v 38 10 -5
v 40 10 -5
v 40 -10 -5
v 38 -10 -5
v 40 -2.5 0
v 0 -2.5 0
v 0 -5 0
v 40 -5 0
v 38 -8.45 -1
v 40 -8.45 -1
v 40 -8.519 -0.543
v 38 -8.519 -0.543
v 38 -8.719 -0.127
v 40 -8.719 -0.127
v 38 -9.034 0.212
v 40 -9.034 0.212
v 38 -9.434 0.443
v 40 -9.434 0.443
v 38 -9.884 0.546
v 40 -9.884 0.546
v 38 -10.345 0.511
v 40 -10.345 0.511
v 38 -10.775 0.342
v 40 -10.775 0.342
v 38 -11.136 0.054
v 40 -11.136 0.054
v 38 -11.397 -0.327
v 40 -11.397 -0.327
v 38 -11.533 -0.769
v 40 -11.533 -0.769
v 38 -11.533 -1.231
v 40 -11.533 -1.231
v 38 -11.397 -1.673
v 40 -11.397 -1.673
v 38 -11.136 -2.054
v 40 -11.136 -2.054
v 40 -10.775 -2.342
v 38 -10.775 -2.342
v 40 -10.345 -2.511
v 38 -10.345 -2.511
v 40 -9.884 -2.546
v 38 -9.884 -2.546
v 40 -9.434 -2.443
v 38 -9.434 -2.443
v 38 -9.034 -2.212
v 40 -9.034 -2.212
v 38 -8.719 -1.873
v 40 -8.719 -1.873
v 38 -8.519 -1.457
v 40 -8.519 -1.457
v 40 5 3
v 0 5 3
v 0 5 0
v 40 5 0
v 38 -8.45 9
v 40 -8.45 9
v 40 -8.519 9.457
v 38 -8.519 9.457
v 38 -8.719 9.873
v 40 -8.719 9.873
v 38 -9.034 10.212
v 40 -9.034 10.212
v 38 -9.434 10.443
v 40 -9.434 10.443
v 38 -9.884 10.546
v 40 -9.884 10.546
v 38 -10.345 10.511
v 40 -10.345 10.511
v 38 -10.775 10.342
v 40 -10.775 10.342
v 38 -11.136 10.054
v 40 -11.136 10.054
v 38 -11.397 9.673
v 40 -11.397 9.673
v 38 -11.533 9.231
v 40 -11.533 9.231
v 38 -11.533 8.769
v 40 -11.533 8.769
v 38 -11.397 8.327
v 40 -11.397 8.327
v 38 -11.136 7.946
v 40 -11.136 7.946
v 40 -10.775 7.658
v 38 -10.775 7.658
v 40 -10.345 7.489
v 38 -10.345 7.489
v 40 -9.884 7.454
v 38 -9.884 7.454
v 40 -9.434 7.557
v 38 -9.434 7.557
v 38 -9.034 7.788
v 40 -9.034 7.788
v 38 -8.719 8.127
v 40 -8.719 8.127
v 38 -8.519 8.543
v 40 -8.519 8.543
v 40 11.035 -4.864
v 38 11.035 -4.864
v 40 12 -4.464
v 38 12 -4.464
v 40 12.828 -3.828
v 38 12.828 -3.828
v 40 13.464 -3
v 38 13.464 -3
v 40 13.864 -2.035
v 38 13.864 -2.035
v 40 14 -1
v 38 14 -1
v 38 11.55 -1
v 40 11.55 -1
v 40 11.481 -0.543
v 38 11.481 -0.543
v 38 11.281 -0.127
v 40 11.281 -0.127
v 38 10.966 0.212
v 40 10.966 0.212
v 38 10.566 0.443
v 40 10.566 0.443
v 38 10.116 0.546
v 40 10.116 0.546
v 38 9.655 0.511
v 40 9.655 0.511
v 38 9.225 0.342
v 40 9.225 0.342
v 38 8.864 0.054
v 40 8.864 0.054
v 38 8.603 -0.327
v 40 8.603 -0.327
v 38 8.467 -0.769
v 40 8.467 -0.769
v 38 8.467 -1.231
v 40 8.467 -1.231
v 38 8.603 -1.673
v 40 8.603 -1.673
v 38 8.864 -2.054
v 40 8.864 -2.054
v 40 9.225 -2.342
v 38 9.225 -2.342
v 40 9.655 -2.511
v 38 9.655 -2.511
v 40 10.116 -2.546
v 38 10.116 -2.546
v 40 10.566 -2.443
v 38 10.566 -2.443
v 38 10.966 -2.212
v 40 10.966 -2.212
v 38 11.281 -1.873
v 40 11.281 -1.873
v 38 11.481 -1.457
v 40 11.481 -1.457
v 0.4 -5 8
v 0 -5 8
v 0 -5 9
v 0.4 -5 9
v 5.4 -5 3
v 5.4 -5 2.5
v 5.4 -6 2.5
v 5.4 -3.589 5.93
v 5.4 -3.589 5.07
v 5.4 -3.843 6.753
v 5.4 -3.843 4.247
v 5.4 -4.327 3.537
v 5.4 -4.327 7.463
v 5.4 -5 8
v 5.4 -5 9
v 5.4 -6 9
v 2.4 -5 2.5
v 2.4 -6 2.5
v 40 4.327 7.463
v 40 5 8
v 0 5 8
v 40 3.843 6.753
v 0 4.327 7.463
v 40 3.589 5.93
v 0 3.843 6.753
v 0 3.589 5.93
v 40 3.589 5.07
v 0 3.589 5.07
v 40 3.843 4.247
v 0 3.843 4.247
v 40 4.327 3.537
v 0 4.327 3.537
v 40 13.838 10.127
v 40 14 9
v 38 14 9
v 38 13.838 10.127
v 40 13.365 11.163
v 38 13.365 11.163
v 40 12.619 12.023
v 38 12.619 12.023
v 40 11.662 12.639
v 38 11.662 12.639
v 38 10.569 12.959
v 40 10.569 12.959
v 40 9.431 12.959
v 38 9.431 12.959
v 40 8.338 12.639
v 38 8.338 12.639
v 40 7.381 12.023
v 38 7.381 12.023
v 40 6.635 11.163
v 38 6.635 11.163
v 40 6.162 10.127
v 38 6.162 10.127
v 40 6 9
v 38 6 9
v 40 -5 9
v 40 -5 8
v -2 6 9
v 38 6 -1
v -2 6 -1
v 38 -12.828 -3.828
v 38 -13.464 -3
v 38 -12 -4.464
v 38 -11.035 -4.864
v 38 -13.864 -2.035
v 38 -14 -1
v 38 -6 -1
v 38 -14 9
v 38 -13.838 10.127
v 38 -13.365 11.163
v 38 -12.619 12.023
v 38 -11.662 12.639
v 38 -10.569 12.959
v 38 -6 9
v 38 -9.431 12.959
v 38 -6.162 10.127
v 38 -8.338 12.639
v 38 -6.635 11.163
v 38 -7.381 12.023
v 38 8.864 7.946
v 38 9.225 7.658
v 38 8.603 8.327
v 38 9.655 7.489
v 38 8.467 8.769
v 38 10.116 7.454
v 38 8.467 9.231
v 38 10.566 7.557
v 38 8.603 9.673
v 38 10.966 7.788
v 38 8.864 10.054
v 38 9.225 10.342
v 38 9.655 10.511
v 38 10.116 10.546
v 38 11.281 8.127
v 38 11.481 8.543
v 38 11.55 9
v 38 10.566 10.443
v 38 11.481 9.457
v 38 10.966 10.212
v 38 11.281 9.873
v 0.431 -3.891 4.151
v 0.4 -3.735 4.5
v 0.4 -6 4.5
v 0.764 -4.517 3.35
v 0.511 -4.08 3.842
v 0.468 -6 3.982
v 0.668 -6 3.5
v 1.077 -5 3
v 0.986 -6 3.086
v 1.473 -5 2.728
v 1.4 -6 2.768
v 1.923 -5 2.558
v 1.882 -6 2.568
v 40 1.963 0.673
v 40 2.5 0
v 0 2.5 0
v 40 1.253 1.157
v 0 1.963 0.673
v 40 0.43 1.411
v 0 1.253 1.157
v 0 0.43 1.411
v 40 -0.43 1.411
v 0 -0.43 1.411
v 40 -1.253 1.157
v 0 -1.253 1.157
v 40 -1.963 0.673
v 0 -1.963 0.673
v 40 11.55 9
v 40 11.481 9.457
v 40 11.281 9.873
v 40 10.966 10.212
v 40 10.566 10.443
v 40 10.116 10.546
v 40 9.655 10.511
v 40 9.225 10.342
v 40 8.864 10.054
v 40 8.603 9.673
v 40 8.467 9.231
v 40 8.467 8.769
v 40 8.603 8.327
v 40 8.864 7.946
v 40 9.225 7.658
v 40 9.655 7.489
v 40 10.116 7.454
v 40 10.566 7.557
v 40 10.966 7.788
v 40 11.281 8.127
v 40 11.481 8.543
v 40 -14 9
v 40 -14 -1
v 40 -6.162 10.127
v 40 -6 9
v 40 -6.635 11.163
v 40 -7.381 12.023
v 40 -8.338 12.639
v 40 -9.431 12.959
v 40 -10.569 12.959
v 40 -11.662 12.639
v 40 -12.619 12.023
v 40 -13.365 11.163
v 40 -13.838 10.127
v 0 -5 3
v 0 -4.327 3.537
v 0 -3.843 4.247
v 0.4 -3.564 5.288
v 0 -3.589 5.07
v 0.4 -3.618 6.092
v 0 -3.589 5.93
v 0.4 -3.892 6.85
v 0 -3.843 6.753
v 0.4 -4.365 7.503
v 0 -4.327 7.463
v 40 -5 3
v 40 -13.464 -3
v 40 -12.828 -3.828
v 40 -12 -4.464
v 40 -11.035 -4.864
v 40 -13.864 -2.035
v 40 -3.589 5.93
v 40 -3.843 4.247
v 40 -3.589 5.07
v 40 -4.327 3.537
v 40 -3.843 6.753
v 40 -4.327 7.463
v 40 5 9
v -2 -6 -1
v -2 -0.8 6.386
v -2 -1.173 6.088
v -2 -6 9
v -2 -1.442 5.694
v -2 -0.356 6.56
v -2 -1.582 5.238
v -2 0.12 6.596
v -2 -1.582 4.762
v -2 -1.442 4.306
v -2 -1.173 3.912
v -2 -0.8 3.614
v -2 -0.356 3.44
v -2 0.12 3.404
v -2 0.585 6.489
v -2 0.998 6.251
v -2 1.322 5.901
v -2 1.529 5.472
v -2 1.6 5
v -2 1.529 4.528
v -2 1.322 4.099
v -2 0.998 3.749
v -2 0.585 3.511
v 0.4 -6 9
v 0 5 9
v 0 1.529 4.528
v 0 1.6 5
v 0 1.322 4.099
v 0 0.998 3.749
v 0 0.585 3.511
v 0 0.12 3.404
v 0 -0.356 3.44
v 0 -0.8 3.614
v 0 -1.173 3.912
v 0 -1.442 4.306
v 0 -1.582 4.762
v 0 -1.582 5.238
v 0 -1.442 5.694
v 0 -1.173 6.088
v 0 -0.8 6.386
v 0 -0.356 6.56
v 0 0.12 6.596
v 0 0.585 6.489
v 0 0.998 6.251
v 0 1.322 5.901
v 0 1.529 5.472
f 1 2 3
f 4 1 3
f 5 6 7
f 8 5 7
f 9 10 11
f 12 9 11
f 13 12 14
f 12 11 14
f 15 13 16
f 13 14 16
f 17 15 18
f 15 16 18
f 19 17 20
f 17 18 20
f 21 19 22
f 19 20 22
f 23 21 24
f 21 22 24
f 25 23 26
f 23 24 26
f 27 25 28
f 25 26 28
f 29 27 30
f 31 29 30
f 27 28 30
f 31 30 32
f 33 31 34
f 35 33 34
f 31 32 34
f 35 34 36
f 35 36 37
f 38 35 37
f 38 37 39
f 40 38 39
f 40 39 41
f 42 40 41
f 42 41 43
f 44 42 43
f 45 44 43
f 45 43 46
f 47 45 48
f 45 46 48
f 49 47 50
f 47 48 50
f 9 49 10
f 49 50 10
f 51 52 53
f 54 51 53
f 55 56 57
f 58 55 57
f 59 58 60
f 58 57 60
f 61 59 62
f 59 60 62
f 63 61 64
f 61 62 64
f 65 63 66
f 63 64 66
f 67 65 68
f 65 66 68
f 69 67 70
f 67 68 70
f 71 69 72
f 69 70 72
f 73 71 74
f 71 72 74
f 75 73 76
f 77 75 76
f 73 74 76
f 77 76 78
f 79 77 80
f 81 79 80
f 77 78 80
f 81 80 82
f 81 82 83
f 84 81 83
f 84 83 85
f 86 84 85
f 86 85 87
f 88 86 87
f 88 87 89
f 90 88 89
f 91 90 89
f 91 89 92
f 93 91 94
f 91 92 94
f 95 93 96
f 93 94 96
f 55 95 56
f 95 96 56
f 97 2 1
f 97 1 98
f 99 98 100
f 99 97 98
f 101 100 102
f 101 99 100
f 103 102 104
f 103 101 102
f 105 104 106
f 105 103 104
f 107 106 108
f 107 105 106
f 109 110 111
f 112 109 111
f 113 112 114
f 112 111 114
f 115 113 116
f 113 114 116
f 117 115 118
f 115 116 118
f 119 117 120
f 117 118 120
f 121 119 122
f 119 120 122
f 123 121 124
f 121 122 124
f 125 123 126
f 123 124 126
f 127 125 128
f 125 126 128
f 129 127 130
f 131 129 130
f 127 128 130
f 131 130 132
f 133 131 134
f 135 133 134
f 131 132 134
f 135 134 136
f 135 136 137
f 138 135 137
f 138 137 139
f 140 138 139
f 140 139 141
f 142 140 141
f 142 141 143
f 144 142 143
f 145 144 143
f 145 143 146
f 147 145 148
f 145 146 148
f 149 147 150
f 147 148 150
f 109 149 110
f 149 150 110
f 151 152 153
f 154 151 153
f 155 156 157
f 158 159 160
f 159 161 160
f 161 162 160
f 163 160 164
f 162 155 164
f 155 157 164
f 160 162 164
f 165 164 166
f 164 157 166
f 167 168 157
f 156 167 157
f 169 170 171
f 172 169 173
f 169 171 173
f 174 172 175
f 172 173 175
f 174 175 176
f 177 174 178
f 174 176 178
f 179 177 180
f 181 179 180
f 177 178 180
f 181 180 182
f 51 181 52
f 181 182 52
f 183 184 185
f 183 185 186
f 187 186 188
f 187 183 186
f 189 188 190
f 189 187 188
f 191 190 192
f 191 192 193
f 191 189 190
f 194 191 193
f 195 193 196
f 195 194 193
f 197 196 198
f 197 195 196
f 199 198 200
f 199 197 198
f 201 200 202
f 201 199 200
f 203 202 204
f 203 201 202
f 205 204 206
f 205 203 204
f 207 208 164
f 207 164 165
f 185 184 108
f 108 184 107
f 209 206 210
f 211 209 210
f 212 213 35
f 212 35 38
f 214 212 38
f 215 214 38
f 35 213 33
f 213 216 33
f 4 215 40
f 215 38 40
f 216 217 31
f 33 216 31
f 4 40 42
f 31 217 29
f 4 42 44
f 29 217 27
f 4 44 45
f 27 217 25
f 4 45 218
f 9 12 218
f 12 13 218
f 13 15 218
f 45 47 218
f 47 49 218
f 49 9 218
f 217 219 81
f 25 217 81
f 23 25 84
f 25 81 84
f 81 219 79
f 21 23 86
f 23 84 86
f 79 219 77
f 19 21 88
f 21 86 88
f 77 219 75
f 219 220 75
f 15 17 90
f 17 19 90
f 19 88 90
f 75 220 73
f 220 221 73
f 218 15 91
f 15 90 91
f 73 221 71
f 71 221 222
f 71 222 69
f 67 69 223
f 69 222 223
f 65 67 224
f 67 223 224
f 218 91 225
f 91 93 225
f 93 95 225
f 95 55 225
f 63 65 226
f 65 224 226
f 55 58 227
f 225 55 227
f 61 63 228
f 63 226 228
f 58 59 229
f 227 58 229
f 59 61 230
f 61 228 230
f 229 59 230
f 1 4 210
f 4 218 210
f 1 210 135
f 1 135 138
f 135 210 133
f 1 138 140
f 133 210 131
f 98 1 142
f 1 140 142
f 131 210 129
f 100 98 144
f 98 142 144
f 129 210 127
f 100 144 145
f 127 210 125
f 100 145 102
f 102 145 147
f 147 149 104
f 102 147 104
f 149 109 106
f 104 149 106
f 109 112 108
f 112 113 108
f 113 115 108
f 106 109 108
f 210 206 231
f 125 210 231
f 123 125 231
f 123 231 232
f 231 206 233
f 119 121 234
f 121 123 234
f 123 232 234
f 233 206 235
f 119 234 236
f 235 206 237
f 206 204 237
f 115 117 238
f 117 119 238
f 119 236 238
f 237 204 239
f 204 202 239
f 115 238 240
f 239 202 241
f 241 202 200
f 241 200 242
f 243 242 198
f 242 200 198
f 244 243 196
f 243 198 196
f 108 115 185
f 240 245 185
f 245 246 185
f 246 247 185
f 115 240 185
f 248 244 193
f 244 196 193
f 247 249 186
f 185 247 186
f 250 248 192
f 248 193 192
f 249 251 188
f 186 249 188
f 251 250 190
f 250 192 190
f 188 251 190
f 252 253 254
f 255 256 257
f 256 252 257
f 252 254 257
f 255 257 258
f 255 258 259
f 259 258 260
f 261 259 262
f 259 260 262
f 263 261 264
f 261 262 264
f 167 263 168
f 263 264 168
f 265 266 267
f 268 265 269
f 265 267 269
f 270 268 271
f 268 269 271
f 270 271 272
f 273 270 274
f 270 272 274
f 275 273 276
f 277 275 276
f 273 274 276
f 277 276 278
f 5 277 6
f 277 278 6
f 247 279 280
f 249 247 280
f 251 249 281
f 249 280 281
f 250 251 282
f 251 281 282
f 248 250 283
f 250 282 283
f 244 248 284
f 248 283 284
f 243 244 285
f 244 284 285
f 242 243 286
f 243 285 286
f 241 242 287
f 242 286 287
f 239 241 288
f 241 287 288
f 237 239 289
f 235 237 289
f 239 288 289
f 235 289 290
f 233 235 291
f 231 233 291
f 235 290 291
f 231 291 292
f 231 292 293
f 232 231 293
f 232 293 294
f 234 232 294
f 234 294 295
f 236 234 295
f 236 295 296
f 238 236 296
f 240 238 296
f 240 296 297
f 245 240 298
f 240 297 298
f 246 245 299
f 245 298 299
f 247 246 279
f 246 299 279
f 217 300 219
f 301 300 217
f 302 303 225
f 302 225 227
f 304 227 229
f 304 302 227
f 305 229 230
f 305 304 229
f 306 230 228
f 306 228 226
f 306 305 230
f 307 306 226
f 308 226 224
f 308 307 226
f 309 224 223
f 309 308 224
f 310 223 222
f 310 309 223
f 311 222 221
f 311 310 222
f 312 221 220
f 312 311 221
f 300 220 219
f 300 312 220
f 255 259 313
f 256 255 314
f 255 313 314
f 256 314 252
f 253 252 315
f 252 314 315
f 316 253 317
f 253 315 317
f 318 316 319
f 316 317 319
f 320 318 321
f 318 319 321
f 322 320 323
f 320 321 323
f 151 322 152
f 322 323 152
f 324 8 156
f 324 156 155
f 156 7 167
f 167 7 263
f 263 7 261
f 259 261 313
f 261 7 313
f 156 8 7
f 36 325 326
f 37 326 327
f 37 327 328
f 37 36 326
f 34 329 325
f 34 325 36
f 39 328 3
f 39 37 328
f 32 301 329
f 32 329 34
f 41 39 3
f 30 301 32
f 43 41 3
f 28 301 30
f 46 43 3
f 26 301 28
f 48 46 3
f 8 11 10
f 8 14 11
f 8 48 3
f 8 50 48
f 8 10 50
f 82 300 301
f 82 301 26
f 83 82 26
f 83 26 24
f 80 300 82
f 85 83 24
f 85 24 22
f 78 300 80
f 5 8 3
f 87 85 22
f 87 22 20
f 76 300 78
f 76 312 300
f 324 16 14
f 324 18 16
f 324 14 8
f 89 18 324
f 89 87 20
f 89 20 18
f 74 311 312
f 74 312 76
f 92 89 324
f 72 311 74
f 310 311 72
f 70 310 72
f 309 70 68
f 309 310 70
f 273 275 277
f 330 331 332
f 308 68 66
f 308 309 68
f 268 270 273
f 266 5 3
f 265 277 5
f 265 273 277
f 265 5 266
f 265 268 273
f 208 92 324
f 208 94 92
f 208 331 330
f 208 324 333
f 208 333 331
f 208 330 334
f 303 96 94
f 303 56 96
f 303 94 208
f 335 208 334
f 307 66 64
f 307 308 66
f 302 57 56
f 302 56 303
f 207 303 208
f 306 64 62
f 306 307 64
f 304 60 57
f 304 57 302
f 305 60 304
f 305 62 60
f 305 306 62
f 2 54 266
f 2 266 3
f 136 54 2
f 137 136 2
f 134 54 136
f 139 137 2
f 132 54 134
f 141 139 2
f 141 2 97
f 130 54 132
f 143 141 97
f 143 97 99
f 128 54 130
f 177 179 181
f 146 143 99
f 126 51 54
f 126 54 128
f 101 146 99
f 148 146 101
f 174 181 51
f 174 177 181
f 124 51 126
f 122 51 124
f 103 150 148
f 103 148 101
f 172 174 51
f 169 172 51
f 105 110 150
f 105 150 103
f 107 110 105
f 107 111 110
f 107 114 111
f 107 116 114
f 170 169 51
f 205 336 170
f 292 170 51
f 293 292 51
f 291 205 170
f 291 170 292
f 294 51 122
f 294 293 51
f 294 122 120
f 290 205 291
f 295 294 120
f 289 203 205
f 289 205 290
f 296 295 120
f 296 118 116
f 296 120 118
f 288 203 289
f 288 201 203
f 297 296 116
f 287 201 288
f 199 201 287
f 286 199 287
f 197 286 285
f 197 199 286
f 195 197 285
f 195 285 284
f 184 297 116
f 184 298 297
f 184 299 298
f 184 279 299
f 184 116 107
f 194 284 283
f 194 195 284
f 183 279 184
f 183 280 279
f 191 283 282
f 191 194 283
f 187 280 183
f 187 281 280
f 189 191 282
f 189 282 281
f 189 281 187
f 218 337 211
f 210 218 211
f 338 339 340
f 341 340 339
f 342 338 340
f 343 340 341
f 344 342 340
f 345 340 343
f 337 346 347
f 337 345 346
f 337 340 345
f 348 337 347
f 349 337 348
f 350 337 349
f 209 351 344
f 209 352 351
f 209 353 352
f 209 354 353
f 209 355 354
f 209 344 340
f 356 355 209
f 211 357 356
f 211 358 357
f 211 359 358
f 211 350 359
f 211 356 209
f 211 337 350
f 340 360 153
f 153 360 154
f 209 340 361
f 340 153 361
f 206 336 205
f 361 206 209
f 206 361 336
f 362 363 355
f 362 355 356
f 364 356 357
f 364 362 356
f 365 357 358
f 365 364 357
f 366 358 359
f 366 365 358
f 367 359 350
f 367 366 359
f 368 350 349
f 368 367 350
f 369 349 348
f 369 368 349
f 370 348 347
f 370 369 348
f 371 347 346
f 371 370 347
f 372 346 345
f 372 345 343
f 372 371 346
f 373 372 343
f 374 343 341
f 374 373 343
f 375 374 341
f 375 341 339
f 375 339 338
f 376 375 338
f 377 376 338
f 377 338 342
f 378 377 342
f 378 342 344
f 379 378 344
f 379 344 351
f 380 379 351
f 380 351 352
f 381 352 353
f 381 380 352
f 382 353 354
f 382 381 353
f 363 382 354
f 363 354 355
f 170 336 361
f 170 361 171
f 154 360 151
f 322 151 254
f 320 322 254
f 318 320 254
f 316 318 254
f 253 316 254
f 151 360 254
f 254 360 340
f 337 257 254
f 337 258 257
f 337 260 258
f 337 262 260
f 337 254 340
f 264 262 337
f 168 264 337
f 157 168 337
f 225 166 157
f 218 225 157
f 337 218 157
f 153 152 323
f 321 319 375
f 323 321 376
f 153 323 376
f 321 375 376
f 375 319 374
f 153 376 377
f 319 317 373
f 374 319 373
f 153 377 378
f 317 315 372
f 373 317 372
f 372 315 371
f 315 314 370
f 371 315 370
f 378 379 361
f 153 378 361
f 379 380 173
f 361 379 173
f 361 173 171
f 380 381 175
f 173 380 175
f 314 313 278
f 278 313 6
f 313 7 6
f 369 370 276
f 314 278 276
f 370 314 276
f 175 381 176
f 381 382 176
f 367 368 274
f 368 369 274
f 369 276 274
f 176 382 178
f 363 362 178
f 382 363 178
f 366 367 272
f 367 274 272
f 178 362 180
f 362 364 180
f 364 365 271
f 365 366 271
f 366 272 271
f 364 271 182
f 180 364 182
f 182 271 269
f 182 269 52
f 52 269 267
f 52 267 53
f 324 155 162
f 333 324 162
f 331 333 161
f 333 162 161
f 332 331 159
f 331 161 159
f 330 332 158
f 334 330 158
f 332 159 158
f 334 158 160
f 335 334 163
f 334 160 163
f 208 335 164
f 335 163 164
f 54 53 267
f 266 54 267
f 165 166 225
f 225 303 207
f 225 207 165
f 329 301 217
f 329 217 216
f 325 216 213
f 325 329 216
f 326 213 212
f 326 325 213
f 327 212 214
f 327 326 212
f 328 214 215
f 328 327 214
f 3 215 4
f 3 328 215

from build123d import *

# Parameters (mm, degrees)
PAD_DEPTH    = 40
SKETCH001_W  = 12
SKETCH001_H  = 10
SKETCH001_R  = 1.6
PAD001_DEPTH = 2
SKETCH002_R  = 1.55
PAD002_DEPTH = 2
POCKET_DEPTH = 5


with BuildPart() as part:
    # Sketch → Pad (new body)
    with BuildSketch(Plane.YZ):
        with BuildLine():
            Line((-5, 8), (-5, 9))
            Line((-5, 9), (-6, 9))
            Line((-6, 9), (-6, -1))
            Line((-6, -1), (6, -1))
            Line((6, -1), (6, 9))
            Line((6, 9), (5, 9))
            Line((5, 9), (5, 8))
            ThreePointArc((5, 8), (3.556624, 5.5), (5, 3))
            Line((5, 3), (5, 0))
            Line((5, 0), (2.5, 0))
            ThreePointArc((2.5, 0), (0, 1.443376), (-2.5, 0))
            Line((-2.5, 0), (-5, 0))
            Line((-5, 0), (-5, 3))
            ThreePointArc((-5, 3), (-3.556624, 5.5), (-5, 8))
        make_face()
    extrude(amount=PAD_DEPTH)

    # Sketch001 (on Face15 of Pad) → Pad001 (join)
    with BuildSketch(Plane(origin=(0, 0, 0), x_dir=(0, 1, 0), z_dir=(-1, 0, 0))):
        with Locations((0, -4)):
            Rectangle(SKETCH001_W, SKETCH001_H)
        with Locations((0, -5)):
            Circle(SKETCH001_R, mode=Mode.SUBTRACT)
    extrude(amount=PAD001_DEPTH)

    # Sketch002 (on Face5 of Pad001) → Pad002 (join)
    with BuildSketch(Plane.YZ.offset(40)):
        with BuildLine():
            ThreePointArc((-6, 9), (-10, 13), (-14, 9))
            Line((-14, 9), (-14, -1))
            ThreePointArc((-14, -1), (-12.828427, -3.828427), (-10, -5))
            Line((10, -5), (-10, -5))
            ThreePointArc((10, -5), (12.828427, -3.828427), (14, -1))
            Line((14, 9), (14, -1))
            ThreePointArc((14, 9), (10, 13), (6, 9))
            Line((5, 0), (6, 9))
            Line((-5, 0), (5, 0))
            Line((-6, 9), (-5, 0))
        make_face()
        with Locations((-10, 9)):
            Circle(SKETCH002_R, mode=Mode.SUBTRACT)
        with Locations((10, 9)):
            Circle(SKETCH002_R, mode=Mode.SUBTRACT)
        with Locations((10, -1)):
            Circle(SKETCH002_R, mode=Mode.SUBTRACT)
        with Locations((-10, -1)):
            Circle(SKETCH002_R, mode=Mode.SUBTRACT)
    extrude(amount=-PAD002_DEPTH)

    # Sketch003 (on Face7 of Pad002) → Pocket (cut)
    with BuildSketch(Plane(origin=(0, -6, 0), x_dir=(0, 0, -1), z_dir=(0, -1, 0))):
        with BuildLine():
            Line((-9, 0.4), (-4.5, 0.4))
            ThreePointArc((-4.5, 0.4), (-3.085786, 0.985786), (-2.5, 2.4))
            Line((-2.5, 2.4), (-2.5, 5.4))
            Line((-2.5, 5.4), (-9, 5.4))
            Line((-9, 5.4), (-9, 0.4))
        make_face()
    extrude(amount=-POCKET_DEPTH, mode=Mode.SUBTRACT)


solid = part.part
